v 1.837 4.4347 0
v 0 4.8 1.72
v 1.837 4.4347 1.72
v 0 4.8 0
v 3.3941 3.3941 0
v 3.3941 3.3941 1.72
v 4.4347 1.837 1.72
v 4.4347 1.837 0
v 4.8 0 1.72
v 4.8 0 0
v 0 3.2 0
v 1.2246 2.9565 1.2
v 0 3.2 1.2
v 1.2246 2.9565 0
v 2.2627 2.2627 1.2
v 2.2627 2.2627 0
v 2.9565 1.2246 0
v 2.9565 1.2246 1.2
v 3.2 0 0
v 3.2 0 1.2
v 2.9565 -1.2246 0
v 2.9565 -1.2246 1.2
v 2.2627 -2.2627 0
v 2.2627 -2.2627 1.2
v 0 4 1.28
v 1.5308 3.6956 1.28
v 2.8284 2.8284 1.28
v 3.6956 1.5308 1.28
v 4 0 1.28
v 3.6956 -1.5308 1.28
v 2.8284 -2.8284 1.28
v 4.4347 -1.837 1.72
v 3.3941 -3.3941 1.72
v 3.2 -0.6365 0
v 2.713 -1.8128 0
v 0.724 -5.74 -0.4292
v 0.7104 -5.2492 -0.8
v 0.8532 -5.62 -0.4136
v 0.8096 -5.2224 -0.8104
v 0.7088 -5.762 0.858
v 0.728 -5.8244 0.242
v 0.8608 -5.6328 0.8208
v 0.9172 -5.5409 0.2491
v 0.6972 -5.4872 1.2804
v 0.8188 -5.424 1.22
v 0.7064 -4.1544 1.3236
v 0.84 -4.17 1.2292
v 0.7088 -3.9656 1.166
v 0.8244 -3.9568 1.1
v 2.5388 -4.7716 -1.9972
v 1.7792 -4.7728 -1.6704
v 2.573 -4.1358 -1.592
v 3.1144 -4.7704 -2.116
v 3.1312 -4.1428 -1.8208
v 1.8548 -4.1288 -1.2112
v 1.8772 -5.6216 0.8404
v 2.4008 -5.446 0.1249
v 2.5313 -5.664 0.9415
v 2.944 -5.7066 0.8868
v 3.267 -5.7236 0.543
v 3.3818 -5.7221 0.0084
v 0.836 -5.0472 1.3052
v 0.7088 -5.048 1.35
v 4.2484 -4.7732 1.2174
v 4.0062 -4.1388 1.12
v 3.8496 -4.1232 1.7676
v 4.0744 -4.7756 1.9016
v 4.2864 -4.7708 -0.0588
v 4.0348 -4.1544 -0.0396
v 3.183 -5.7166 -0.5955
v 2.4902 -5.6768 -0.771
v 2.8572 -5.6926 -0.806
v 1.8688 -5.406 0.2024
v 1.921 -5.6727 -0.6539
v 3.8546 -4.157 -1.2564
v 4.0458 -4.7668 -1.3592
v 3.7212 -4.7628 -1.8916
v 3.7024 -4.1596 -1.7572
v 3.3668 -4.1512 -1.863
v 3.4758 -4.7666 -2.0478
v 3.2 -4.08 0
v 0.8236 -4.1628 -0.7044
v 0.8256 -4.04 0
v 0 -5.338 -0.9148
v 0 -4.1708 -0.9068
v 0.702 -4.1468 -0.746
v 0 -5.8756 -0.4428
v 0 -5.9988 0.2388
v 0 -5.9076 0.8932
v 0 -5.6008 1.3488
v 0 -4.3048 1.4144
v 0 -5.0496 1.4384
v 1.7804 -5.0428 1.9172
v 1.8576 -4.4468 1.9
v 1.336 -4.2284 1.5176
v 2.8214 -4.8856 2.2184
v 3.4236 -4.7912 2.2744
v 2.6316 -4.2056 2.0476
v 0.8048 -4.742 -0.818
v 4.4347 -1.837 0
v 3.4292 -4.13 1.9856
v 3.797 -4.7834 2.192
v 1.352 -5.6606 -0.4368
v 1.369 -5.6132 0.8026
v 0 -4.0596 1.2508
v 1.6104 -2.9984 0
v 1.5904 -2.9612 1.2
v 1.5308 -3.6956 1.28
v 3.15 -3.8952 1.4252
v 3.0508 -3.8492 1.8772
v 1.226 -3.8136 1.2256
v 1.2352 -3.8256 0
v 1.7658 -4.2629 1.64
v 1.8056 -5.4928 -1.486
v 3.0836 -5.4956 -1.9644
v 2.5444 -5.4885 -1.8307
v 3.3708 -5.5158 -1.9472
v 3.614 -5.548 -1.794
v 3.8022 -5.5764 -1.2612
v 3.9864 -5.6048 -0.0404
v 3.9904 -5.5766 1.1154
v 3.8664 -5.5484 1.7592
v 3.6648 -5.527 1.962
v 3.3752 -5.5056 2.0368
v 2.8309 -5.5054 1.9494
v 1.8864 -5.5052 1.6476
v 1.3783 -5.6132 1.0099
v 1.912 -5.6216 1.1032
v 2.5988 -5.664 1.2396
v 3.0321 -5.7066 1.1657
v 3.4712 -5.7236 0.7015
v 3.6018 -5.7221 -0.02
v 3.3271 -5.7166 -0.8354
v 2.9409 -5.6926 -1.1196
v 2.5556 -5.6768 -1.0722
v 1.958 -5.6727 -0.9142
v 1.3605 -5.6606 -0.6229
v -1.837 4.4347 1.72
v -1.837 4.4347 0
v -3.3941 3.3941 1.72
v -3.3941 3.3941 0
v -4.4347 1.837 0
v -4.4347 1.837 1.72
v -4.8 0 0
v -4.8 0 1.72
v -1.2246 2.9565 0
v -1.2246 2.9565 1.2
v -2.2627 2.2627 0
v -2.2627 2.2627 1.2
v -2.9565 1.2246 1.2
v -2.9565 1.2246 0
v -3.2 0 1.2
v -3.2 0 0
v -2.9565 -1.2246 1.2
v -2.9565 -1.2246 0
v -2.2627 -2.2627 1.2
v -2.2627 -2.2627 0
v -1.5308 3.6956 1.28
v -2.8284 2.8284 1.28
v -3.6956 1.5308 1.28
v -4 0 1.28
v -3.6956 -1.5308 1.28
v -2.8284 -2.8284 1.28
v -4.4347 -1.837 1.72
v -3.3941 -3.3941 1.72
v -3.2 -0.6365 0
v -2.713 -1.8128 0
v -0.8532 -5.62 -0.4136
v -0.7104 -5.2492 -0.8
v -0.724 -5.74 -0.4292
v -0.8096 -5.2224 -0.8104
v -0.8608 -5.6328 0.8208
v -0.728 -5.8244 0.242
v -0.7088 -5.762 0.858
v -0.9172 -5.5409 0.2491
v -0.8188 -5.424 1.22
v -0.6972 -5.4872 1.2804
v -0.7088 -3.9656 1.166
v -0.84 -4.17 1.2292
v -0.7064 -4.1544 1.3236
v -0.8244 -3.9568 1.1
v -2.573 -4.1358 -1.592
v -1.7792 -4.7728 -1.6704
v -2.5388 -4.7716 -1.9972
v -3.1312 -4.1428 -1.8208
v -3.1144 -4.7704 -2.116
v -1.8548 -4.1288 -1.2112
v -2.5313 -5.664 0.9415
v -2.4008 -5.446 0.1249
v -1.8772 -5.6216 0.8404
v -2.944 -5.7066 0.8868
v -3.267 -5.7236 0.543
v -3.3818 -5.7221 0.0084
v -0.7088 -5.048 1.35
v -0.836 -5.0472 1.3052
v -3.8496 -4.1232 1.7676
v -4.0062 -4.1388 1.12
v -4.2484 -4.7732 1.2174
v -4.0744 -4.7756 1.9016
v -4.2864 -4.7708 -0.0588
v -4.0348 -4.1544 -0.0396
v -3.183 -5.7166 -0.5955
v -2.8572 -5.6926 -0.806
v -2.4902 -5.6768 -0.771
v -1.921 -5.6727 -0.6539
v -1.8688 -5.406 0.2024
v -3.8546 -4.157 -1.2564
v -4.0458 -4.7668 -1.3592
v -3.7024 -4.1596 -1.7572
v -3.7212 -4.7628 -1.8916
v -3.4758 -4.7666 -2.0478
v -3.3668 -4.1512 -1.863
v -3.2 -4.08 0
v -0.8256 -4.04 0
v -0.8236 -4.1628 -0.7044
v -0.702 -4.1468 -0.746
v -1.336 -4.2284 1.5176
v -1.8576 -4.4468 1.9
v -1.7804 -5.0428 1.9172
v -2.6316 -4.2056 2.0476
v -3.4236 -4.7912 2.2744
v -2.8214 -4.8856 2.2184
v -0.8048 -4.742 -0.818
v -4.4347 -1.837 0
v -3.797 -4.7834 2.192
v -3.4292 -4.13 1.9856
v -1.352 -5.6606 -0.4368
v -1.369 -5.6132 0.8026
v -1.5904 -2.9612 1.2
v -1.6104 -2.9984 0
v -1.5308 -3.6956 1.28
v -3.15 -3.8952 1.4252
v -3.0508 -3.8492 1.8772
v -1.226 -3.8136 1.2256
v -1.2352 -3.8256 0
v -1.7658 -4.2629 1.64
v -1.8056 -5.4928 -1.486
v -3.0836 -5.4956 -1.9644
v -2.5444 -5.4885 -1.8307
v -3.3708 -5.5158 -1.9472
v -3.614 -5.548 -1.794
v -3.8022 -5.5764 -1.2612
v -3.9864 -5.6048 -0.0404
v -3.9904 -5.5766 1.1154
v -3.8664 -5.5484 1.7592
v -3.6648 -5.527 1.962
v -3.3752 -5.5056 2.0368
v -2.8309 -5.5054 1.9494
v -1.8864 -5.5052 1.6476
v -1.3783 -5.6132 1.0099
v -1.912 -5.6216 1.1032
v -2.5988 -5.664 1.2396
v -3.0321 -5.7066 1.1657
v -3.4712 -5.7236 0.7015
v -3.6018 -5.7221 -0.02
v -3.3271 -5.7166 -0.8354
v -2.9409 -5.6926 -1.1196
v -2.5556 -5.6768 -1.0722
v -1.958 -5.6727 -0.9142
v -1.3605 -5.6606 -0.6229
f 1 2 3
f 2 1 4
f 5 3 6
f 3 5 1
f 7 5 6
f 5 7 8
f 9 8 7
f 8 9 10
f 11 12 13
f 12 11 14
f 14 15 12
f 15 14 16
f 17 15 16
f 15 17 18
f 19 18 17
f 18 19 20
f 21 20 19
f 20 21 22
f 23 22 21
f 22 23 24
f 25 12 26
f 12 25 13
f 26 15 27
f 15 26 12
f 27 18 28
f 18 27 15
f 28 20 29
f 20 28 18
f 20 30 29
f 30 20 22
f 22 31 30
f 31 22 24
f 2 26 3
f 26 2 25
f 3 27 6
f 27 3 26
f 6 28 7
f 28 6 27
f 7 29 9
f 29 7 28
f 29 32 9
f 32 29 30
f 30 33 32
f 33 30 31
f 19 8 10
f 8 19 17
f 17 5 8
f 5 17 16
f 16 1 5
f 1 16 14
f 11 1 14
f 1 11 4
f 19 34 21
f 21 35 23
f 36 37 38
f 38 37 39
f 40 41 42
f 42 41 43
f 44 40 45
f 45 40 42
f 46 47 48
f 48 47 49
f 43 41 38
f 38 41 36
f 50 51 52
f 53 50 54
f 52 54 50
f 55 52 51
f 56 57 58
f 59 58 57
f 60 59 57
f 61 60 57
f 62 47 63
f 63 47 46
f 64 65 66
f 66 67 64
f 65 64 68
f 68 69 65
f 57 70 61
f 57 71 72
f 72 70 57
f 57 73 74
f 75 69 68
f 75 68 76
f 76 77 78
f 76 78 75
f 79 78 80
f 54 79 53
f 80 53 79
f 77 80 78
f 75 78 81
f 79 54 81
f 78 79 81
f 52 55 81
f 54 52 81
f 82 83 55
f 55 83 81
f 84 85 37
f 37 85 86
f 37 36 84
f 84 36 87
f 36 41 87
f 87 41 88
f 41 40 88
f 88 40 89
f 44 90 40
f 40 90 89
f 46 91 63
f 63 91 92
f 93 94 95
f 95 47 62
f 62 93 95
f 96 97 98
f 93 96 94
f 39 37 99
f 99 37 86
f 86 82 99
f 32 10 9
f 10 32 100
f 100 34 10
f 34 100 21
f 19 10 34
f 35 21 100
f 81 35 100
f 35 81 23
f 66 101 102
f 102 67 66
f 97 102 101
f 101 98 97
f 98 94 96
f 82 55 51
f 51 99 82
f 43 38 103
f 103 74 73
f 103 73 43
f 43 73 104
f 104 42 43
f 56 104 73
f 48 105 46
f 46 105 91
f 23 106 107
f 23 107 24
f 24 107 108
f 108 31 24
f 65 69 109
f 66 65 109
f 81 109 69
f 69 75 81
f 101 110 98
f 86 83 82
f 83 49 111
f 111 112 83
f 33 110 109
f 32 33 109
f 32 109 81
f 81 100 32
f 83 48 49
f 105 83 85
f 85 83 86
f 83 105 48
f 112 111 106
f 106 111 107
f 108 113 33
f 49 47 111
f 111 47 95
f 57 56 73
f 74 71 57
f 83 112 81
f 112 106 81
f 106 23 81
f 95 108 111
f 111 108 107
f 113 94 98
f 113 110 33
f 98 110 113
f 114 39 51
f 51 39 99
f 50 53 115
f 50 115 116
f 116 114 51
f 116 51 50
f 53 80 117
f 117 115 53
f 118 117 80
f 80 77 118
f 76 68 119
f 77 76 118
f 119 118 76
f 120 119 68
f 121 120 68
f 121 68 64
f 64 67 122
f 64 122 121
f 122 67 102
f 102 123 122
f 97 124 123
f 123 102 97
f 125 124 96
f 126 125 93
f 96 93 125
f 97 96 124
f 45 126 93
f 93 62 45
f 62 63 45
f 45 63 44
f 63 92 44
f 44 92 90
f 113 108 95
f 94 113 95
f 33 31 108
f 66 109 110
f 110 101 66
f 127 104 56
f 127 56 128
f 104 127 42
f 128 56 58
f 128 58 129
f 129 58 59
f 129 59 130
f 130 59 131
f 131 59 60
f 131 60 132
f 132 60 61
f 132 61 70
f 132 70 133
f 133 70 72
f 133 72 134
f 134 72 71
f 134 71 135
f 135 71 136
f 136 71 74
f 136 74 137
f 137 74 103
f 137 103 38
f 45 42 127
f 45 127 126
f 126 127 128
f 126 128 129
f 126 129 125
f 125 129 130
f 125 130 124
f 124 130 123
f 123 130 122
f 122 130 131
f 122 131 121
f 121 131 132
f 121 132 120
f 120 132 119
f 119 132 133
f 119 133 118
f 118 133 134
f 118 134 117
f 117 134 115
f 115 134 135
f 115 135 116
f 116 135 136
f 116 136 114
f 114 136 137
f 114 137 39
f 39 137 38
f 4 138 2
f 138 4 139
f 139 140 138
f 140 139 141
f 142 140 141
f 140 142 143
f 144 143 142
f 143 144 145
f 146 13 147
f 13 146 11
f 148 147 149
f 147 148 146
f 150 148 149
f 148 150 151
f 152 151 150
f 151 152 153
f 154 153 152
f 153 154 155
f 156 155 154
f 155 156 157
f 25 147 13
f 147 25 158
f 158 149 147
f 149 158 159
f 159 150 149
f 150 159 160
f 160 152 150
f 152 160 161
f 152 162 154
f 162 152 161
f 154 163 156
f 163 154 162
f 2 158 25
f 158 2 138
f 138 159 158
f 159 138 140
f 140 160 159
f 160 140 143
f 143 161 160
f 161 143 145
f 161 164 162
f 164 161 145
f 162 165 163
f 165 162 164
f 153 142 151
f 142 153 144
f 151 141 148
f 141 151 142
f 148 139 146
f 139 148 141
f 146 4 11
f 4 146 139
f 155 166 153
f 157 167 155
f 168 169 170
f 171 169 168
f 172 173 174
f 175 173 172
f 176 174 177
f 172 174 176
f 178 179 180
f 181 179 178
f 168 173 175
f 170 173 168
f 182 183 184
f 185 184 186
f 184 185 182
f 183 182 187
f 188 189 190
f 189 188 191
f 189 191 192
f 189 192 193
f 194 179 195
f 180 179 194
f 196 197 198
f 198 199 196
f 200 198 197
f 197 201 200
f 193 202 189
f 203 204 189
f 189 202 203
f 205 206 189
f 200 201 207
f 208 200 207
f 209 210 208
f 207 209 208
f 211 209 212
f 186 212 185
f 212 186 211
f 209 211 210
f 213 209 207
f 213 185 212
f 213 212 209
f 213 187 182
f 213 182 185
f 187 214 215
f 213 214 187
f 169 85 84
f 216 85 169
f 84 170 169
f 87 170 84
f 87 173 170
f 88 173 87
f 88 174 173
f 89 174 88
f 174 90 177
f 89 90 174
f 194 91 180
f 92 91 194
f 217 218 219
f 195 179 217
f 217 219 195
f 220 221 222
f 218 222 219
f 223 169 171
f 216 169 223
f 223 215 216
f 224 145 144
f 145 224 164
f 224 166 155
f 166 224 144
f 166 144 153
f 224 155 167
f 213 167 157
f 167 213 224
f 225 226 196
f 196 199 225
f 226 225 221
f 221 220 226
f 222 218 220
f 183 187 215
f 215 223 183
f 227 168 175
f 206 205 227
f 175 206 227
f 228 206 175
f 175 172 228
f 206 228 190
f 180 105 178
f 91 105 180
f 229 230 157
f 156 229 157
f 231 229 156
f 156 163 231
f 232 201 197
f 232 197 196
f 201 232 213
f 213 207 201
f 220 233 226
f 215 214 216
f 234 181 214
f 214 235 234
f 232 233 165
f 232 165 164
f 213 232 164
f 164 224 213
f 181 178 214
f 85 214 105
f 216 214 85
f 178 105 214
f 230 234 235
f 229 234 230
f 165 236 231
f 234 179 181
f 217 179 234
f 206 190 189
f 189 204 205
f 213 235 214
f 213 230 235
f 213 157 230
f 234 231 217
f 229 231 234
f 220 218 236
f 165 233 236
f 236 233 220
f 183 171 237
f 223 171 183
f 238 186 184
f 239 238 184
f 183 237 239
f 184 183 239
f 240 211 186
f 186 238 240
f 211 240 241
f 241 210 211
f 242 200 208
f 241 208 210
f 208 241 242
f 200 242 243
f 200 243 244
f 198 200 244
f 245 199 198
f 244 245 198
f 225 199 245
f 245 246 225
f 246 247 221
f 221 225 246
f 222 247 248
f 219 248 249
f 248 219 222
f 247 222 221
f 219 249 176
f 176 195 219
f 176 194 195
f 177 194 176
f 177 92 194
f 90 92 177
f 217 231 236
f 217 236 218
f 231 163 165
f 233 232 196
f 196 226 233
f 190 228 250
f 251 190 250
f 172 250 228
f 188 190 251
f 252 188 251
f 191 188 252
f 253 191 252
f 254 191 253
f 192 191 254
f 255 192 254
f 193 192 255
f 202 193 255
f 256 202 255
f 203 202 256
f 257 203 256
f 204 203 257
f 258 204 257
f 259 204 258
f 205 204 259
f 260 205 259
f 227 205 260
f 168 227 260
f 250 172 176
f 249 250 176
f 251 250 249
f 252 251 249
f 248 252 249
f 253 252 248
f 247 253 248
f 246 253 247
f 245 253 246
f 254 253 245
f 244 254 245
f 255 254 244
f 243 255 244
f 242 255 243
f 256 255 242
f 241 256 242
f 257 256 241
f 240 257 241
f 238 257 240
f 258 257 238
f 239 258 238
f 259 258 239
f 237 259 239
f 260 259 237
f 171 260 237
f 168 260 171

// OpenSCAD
use <../lib.scad>
use <s/27151s01.scad>
function ldraw_lib__27151() = [
// 0 Minifig Bowtie
// 0 Name: 27151.dat
// 0 Author: Gerald Lasser [GeraldLasser]
// 0 !LDRAW_ORG Part UPDATE 2024-06
// 0 !LICENSE Licensed under CC BY 4.0 : see CAreadme.txt
// 
// 0 BFC CERTIFY CCW
  [0,"BFC","CERTIFY"],
  [0,"BFC","CCW"],
// 
// 0 !CATEGORY Minifig Neckwear
// 
// 0 !HISTORY 2018-01-28 {LEGO Digital Designer} Original part shape
// 0 !HISTORY 2023-04-24 [GeraldLasser] File preparation for LDraw Parts Tracker
// 0 !HISTORY 2024-07-29 [OrionP] Official Update 2024-06
// 
// 1 16 0 0 0 1 0 0 0 1 0 0 0 1 s\27151s01.dat
  [1,16,0,0,0,1,0,0,0,1,0,0,0,1, ldraw_lib__s__27151s01()],
// 1 16 0 0 0 -1 0 0 0 1 0 0 0 1 s\27151s01.dat
  [1,16,0,0,0,-1,0,0,0,1,0,0,0,1, ldraw_lib__s__27151s01()],
// 
// 5 24 0 2.287 -13.345 0 2.267 -10.427 1.776 2 -13.123 -1.776 2 -13.123
  [5,24,0,2.287,-13.345,0,2.267,-10.427,1.776,2,-13.123,-1.776,2,-13.123],
// 5 24 0 1.107 -14.689 0 2.287 -13.345 1.81 1.073 -14.35 -1.81 1.073 -14.35
  [5,24,0,1.107,-14.689,0,2.287,-13.345,1.81,1.073,-14.35,-1.81,1.073,-14.35],
// 5 24 0 -.597 -14.997 0 1.107 -14.689 1.82 -.605 -14.561 -1.82 -.605 -14.561
  [5,24,0,-.597,-14.997,0,1.107,-14.689,1.82,-.605,-14.561,-1.82,-.605,-14.561],
// 5 24 0 -2.233 -14.769 0 -.597 -14.997 1.772 -2.145 -14.405 -1.772 -2.145 -14.405
  [5,24,0,-2.233,-14.769,0,-.597,-14.997,1.772,-2.145,-14.405,-1.772,-2.145,-14.405],
// 5 24 0 -3.372 -14.002 0 -2.233 -14.769 1.772 -2.145 -14.405 -1.772 -2.145 -14.405
  [5,24,0,-3.372,-14.002,0,-2.233,-14.769,1.772,-2.145,-14.405,-1.772,-2.145,-14.405],
// 5 24 0 -3.536 -10.762 0 -3.596 -12.624 1.772 -3.375 -12.62 -1.772 -3.375 -12.62
  [5,24,0,-3.536,-10.762,0,-3.596,-12.624,1.772,-3.375,-12.62,-1.772,-3.375,-12.62],
// 5 24 0 -3.127 -10.149 0 -3.536 -10.762 1.766 -3.309 -10.386 -1.766 -3.309 -10.386
  [5,24,0,-3.127,-10.149,0,-3.536,-10.762,1.766,-3.309,-10.386,-1.766,-3.309,-10.386],
// 5 24 0 -3.596 -12.624 0 -3.372 -14.002 1.743 -3.201 -13.718 -1.743 -3.201 -13.718
  [5,24,0,-3.596,-12.624,0,-3.372,-14.002,1.743,-3.201,-13.718,-1.743,-3.201,-13.718],
// 
// 5 24 0 2.267 -10.427 0 -3.127 -10.149 -2.064 0 -10.1 2.064 0 -10.1
  [5,24,0,2.267,-10.427,0,-3.127,-10.149,-2.064,0,-10.1,2.064,0,-10.1],
];
module ldraw_lib__27151(step=0, col=false, unit=2/5, alt=false, line=0.2, solid=!$preview)
    makepoly(ldraw_lib__27151(), step=step, col=col, unit=unit, alt=alt, line=line, solid=solid);
ldraw_lib__27151(line=0.2);
